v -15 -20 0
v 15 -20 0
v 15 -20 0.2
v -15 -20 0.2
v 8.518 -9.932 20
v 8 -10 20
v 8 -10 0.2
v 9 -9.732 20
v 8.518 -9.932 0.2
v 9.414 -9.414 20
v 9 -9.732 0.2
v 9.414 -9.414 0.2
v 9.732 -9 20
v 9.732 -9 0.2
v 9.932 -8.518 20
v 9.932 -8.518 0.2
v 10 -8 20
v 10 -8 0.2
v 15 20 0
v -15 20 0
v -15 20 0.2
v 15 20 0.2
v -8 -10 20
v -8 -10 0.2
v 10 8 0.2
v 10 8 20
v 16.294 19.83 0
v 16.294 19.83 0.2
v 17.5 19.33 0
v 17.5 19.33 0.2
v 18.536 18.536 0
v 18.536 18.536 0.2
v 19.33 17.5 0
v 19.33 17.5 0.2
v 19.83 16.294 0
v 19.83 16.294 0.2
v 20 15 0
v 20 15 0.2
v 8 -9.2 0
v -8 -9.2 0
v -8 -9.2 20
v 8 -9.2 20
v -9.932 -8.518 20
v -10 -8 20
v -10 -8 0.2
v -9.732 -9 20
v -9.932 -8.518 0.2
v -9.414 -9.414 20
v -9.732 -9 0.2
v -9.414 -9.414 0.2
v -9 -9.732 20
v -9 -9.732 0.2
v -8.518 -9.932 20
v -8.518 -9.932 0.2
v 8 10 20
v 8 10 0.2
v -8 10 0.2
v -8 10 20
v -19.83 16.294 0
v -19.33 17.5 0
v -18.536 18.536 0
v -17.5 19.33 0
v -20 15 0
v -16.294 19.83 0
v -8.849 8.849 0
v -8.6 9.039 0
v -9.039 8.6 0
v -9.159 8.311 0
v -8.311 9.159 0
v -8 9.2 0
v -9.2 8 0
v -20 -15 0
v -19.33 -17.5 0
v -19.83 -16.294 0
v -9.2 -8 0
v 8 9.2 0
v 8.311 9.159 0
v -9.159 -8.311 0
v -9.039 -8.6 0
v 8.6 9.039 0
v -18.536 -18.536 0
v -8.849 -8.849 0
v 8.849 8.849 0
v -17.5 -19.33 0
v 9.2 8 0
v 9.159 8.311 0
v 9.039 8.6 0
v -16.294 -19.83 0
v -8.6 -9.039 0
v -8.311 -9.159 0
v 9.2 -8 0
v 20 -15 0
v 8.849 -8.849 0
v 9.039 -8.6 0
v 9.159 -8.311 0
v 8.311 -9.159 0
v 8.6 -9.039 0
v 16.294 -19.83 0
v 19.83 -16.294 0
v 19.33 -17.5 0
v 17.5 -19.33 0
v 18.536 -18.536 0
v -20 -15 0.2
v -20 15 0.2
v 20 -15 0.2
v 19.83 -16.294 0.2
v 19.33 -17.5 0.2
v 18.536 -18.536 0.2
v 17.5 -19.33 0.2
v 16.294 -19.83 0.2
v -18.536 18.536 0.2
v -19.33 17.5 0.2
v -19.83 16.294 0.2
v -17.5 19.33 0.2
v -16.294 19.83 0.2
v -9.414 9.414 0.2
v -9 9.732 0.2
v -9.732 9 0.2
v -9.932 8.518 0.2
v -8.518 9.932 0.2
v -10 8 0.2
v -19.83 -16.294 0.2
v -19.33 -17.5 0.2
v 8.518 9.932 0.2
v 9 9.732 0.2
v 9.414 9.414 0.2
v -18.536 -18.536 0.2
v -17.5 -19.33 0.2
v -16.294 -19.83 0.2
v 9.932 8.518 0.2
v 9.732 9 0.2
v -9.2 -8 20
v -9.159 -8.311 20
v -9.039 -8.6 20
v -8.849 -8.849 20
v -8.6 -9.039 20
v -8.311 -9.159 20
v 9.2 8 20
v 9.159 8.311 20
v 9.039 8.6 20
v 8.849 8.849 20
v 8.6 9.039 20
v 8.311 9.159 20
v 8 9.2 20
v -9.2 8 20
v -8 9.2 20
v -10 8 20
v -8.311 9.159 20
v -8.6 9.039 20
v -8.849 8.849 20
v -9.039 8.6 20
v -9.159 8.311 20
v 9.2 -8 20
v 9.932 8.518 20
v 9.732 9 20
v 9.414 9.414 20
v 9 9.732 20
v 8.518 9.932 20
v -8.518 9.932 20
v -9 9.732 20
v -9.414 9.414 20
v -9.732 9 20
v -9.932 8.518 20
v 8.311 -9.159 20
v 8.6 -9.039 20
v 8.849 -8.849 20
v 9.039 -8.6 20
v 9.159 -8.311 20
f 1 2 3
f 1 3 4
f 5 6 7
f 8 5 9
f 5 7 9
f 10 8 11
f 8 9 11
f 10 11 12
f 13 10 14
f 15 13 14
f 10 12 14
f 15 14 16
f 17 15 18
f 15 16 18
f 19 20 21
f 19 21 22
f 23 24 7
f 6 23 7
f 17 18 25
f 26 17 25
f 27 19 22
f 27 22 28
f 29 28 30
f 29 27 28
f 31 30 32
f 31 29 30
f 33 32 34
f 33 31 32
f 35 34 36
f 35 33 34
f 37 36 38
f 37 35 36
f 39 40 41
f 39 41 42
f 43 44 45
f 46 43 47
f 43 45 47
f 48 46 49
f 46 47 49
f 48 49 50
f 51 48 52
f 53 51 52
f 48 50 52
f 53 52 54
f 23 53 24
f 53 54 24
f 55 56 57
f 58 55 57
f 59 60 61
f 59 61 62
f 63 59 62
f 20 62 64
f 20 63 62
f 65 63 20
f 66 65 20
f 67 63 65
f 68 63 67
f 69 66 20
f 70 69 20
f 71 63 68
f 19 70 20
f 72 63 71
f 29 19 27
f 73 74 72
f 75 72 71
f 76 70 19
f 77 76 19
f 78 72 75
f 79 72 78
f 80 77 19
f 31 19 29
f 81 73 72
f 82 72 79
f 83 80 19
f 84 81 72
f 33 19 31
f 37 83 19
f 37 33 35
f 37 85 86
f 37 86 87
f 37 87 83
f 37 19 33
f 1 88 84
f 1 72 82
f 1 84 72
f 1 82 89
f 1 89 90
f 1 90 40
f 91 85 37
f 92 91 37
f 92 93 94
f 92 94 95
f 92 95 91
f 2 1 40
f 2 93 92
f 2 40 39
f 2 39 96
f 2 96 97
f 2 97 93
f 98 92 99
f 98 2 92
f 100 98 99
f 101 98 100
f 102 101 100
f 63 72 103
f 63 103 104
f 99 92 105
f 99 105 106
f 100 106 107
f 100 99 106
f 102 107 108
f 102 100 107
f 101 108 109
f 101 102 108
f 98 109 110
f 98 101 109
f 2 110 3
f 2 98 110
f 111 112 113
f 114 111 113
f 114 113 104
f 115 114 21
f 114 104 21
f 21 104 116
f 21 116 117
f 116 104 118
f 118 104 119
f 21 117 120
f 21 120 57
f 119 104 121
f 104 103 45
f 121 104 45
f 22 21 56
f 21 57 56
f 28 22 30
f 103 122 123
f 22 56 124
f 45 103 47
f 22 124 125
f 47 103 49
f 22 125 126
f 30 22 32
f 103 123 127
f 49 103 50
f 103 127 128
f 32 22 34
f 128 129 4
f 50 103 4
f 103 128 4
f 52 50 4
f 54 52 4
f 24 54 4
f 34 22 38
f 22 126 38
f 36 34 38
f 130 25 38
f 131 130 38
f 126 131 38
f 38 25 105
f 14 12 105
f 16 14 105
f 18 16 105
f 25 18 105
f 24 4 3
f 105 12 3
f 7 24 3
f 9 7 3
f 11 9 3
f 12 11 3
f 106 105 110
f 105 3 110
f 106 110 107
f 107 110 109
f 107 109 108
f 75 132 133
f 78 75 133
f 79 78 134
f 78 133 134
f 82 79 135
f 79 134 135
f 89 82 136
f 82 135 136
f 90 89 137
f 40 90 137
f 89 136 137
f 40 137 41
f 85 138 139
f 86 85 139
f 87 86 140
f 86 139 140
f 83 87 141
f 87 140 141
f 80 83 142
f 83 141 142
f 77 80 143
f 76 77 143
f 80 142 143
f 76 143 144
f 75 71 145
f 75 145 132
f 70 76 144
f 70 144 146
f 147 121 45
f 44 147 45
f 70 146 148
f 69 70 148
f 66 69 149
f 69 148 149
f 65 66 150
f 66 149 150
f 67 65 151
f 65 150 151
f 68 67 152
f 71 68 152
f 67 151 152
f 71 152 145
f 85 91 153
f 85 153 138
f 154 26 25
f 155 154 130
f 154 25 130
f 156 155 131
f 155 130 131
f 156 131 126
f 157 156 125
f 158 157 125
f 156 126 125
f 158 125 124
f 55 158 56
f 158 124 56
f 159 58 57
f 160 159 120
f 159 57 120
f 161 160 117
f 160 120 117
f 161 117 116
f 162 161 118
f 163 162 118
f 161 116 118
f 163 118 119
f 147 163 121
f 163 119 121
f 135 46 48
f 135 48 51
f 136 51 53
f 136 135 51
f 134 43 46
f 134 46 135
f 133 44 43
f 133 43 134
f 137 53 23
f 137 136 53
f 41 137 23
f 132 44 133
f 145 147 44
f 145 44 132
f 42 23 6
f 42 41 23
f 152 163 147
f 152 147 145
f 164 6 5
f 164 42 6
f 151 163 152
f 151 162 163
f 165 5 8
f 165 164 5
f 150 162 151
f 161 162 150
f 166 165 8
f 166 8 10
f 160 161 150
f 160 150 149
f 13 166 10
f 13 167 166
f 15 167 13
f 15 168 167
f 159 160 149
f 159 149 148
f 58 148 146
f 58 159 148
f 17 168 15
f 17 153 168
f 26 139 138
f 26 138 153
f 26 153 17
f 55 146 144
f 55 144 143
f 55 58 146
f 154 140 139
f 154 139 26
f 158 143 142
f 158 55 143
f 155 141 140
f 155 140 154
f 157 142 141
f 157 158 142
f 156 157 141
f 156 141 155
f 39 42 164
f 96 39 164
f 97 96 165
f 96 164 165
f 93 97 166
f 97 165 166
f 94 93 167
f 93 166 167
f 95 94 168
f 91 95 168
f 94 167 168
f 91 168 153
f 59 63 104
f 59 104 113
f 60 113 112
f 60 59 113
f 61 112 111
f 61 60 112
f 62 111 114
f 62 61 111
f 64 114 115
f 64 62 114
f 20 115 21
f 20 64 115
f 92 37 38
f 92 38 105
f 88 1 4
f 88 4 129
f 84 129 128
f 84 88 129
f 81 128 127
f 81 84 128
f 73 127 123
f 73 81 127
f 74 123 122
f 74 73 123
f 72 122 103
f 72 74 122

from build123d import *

# Parameters (mm, degrees)
F1_DEPTH = 20
F3_DEPTH = 0.2
F5_DEPTH = 20.001


with BuildPart() as f1:
    # F0 (on Top) → F1 (new body)
    with BuildSketch(Plane.XY):
        with BuildLine():
            Line((8, 10), (-8, 10))
            ThreePointArc((-8, 10), (-9.414214, 9.414214), (-10, 8))
            Line((-10, 8), (-10, -8))
            ThreePointArc((-10, -8), (-9.414214, -9.414214), (-8, -10))
            Line((-8, -10), (8, -10))
            ThreePointArc((8, -10), (9.414214, -9.414214), (10, -8))
            Line((10, -8), (10, 8))
            ThreePointArc((10, 8), (9.414214, 9.414214), (8, 10))
        make_face()
    extrude(amount=F1_DEPTH)

    # F2 (on face) → F3 (join)
    with BuildSketch(Plane(origin=(0, 0, 0), x_dir=(1, 0, 0), z_dir=(0, 0, -1))):
        with BuildLine():
            Line((15, 20), (-15, 20))
            ThreePointArc((-15, 20), (-18.535534, 18.535534), (-20, 15))
            Line((-20, 15), (-20, -15))
            ThreePointArc((-20, -15), (-18.535534, -18.535534), (-15, -20))
            Line((-15, -20), (15, -20))
            ThreePointArc((15, -20), (18.535534, -18.535534), (20, -15))
            Line((20, -15), (20, 15))
            ThreePointArc((20, 15), (18.535534, 18.535534), (15, 20))
        make_face()
        with BuildLine():
            Line((8, -10), (-8, -10))
            ThreePointArc((-8, -10), (-9.414214, -9.414214), (-10, -8))
            Line((-10, -8), (-10, 8))
            ThreePointArc((-10, 8), (-9.414214, 9.414214), (-8, 10))
            Line((-8, 10), (8, 10))
            ThreePointArc((8, 10), (9.414214, 9.414214), (10, 8))
            Line((10, 8), (10, -8))
            ThreePointArc((10, -8), (9.414214, -9.414214), (8, -10))
        make_face(mode=Mode.SUBTRACT)
    extrude(amount=-F3_DEPTH)

    # F4 (on face) → F5 (cut, through all)
    with BuildSketch(Plane.XY.offset(20)):
        with BuildLine():
            ThreePointArc((-8, 9.2), (-8.848528, 8.848528), (-9.2, 8))
            Line((-9.2, 8), (-9.2, -8))
            ThreePointArc((-9.2, -8), (-8.848528, -8.848528), (-8, -9.2))
            Line((-8, -9.2), (8, -9.2))
            ThreePointArc((8, -9.2), (8.848528, -8.848528), (9.2, -8))
            Line((9.2, -8), (9.2, 8))
            ThreePointArc((9.2, 8), (8.848528, 8.848528), (8, 9.2))
            Line((8, 9.2), (-8, 9.2))
        make_face()
    extrude(amount=-F5_DEPTH, mode=Mode.SUBTRACT)


solid = f1.part
